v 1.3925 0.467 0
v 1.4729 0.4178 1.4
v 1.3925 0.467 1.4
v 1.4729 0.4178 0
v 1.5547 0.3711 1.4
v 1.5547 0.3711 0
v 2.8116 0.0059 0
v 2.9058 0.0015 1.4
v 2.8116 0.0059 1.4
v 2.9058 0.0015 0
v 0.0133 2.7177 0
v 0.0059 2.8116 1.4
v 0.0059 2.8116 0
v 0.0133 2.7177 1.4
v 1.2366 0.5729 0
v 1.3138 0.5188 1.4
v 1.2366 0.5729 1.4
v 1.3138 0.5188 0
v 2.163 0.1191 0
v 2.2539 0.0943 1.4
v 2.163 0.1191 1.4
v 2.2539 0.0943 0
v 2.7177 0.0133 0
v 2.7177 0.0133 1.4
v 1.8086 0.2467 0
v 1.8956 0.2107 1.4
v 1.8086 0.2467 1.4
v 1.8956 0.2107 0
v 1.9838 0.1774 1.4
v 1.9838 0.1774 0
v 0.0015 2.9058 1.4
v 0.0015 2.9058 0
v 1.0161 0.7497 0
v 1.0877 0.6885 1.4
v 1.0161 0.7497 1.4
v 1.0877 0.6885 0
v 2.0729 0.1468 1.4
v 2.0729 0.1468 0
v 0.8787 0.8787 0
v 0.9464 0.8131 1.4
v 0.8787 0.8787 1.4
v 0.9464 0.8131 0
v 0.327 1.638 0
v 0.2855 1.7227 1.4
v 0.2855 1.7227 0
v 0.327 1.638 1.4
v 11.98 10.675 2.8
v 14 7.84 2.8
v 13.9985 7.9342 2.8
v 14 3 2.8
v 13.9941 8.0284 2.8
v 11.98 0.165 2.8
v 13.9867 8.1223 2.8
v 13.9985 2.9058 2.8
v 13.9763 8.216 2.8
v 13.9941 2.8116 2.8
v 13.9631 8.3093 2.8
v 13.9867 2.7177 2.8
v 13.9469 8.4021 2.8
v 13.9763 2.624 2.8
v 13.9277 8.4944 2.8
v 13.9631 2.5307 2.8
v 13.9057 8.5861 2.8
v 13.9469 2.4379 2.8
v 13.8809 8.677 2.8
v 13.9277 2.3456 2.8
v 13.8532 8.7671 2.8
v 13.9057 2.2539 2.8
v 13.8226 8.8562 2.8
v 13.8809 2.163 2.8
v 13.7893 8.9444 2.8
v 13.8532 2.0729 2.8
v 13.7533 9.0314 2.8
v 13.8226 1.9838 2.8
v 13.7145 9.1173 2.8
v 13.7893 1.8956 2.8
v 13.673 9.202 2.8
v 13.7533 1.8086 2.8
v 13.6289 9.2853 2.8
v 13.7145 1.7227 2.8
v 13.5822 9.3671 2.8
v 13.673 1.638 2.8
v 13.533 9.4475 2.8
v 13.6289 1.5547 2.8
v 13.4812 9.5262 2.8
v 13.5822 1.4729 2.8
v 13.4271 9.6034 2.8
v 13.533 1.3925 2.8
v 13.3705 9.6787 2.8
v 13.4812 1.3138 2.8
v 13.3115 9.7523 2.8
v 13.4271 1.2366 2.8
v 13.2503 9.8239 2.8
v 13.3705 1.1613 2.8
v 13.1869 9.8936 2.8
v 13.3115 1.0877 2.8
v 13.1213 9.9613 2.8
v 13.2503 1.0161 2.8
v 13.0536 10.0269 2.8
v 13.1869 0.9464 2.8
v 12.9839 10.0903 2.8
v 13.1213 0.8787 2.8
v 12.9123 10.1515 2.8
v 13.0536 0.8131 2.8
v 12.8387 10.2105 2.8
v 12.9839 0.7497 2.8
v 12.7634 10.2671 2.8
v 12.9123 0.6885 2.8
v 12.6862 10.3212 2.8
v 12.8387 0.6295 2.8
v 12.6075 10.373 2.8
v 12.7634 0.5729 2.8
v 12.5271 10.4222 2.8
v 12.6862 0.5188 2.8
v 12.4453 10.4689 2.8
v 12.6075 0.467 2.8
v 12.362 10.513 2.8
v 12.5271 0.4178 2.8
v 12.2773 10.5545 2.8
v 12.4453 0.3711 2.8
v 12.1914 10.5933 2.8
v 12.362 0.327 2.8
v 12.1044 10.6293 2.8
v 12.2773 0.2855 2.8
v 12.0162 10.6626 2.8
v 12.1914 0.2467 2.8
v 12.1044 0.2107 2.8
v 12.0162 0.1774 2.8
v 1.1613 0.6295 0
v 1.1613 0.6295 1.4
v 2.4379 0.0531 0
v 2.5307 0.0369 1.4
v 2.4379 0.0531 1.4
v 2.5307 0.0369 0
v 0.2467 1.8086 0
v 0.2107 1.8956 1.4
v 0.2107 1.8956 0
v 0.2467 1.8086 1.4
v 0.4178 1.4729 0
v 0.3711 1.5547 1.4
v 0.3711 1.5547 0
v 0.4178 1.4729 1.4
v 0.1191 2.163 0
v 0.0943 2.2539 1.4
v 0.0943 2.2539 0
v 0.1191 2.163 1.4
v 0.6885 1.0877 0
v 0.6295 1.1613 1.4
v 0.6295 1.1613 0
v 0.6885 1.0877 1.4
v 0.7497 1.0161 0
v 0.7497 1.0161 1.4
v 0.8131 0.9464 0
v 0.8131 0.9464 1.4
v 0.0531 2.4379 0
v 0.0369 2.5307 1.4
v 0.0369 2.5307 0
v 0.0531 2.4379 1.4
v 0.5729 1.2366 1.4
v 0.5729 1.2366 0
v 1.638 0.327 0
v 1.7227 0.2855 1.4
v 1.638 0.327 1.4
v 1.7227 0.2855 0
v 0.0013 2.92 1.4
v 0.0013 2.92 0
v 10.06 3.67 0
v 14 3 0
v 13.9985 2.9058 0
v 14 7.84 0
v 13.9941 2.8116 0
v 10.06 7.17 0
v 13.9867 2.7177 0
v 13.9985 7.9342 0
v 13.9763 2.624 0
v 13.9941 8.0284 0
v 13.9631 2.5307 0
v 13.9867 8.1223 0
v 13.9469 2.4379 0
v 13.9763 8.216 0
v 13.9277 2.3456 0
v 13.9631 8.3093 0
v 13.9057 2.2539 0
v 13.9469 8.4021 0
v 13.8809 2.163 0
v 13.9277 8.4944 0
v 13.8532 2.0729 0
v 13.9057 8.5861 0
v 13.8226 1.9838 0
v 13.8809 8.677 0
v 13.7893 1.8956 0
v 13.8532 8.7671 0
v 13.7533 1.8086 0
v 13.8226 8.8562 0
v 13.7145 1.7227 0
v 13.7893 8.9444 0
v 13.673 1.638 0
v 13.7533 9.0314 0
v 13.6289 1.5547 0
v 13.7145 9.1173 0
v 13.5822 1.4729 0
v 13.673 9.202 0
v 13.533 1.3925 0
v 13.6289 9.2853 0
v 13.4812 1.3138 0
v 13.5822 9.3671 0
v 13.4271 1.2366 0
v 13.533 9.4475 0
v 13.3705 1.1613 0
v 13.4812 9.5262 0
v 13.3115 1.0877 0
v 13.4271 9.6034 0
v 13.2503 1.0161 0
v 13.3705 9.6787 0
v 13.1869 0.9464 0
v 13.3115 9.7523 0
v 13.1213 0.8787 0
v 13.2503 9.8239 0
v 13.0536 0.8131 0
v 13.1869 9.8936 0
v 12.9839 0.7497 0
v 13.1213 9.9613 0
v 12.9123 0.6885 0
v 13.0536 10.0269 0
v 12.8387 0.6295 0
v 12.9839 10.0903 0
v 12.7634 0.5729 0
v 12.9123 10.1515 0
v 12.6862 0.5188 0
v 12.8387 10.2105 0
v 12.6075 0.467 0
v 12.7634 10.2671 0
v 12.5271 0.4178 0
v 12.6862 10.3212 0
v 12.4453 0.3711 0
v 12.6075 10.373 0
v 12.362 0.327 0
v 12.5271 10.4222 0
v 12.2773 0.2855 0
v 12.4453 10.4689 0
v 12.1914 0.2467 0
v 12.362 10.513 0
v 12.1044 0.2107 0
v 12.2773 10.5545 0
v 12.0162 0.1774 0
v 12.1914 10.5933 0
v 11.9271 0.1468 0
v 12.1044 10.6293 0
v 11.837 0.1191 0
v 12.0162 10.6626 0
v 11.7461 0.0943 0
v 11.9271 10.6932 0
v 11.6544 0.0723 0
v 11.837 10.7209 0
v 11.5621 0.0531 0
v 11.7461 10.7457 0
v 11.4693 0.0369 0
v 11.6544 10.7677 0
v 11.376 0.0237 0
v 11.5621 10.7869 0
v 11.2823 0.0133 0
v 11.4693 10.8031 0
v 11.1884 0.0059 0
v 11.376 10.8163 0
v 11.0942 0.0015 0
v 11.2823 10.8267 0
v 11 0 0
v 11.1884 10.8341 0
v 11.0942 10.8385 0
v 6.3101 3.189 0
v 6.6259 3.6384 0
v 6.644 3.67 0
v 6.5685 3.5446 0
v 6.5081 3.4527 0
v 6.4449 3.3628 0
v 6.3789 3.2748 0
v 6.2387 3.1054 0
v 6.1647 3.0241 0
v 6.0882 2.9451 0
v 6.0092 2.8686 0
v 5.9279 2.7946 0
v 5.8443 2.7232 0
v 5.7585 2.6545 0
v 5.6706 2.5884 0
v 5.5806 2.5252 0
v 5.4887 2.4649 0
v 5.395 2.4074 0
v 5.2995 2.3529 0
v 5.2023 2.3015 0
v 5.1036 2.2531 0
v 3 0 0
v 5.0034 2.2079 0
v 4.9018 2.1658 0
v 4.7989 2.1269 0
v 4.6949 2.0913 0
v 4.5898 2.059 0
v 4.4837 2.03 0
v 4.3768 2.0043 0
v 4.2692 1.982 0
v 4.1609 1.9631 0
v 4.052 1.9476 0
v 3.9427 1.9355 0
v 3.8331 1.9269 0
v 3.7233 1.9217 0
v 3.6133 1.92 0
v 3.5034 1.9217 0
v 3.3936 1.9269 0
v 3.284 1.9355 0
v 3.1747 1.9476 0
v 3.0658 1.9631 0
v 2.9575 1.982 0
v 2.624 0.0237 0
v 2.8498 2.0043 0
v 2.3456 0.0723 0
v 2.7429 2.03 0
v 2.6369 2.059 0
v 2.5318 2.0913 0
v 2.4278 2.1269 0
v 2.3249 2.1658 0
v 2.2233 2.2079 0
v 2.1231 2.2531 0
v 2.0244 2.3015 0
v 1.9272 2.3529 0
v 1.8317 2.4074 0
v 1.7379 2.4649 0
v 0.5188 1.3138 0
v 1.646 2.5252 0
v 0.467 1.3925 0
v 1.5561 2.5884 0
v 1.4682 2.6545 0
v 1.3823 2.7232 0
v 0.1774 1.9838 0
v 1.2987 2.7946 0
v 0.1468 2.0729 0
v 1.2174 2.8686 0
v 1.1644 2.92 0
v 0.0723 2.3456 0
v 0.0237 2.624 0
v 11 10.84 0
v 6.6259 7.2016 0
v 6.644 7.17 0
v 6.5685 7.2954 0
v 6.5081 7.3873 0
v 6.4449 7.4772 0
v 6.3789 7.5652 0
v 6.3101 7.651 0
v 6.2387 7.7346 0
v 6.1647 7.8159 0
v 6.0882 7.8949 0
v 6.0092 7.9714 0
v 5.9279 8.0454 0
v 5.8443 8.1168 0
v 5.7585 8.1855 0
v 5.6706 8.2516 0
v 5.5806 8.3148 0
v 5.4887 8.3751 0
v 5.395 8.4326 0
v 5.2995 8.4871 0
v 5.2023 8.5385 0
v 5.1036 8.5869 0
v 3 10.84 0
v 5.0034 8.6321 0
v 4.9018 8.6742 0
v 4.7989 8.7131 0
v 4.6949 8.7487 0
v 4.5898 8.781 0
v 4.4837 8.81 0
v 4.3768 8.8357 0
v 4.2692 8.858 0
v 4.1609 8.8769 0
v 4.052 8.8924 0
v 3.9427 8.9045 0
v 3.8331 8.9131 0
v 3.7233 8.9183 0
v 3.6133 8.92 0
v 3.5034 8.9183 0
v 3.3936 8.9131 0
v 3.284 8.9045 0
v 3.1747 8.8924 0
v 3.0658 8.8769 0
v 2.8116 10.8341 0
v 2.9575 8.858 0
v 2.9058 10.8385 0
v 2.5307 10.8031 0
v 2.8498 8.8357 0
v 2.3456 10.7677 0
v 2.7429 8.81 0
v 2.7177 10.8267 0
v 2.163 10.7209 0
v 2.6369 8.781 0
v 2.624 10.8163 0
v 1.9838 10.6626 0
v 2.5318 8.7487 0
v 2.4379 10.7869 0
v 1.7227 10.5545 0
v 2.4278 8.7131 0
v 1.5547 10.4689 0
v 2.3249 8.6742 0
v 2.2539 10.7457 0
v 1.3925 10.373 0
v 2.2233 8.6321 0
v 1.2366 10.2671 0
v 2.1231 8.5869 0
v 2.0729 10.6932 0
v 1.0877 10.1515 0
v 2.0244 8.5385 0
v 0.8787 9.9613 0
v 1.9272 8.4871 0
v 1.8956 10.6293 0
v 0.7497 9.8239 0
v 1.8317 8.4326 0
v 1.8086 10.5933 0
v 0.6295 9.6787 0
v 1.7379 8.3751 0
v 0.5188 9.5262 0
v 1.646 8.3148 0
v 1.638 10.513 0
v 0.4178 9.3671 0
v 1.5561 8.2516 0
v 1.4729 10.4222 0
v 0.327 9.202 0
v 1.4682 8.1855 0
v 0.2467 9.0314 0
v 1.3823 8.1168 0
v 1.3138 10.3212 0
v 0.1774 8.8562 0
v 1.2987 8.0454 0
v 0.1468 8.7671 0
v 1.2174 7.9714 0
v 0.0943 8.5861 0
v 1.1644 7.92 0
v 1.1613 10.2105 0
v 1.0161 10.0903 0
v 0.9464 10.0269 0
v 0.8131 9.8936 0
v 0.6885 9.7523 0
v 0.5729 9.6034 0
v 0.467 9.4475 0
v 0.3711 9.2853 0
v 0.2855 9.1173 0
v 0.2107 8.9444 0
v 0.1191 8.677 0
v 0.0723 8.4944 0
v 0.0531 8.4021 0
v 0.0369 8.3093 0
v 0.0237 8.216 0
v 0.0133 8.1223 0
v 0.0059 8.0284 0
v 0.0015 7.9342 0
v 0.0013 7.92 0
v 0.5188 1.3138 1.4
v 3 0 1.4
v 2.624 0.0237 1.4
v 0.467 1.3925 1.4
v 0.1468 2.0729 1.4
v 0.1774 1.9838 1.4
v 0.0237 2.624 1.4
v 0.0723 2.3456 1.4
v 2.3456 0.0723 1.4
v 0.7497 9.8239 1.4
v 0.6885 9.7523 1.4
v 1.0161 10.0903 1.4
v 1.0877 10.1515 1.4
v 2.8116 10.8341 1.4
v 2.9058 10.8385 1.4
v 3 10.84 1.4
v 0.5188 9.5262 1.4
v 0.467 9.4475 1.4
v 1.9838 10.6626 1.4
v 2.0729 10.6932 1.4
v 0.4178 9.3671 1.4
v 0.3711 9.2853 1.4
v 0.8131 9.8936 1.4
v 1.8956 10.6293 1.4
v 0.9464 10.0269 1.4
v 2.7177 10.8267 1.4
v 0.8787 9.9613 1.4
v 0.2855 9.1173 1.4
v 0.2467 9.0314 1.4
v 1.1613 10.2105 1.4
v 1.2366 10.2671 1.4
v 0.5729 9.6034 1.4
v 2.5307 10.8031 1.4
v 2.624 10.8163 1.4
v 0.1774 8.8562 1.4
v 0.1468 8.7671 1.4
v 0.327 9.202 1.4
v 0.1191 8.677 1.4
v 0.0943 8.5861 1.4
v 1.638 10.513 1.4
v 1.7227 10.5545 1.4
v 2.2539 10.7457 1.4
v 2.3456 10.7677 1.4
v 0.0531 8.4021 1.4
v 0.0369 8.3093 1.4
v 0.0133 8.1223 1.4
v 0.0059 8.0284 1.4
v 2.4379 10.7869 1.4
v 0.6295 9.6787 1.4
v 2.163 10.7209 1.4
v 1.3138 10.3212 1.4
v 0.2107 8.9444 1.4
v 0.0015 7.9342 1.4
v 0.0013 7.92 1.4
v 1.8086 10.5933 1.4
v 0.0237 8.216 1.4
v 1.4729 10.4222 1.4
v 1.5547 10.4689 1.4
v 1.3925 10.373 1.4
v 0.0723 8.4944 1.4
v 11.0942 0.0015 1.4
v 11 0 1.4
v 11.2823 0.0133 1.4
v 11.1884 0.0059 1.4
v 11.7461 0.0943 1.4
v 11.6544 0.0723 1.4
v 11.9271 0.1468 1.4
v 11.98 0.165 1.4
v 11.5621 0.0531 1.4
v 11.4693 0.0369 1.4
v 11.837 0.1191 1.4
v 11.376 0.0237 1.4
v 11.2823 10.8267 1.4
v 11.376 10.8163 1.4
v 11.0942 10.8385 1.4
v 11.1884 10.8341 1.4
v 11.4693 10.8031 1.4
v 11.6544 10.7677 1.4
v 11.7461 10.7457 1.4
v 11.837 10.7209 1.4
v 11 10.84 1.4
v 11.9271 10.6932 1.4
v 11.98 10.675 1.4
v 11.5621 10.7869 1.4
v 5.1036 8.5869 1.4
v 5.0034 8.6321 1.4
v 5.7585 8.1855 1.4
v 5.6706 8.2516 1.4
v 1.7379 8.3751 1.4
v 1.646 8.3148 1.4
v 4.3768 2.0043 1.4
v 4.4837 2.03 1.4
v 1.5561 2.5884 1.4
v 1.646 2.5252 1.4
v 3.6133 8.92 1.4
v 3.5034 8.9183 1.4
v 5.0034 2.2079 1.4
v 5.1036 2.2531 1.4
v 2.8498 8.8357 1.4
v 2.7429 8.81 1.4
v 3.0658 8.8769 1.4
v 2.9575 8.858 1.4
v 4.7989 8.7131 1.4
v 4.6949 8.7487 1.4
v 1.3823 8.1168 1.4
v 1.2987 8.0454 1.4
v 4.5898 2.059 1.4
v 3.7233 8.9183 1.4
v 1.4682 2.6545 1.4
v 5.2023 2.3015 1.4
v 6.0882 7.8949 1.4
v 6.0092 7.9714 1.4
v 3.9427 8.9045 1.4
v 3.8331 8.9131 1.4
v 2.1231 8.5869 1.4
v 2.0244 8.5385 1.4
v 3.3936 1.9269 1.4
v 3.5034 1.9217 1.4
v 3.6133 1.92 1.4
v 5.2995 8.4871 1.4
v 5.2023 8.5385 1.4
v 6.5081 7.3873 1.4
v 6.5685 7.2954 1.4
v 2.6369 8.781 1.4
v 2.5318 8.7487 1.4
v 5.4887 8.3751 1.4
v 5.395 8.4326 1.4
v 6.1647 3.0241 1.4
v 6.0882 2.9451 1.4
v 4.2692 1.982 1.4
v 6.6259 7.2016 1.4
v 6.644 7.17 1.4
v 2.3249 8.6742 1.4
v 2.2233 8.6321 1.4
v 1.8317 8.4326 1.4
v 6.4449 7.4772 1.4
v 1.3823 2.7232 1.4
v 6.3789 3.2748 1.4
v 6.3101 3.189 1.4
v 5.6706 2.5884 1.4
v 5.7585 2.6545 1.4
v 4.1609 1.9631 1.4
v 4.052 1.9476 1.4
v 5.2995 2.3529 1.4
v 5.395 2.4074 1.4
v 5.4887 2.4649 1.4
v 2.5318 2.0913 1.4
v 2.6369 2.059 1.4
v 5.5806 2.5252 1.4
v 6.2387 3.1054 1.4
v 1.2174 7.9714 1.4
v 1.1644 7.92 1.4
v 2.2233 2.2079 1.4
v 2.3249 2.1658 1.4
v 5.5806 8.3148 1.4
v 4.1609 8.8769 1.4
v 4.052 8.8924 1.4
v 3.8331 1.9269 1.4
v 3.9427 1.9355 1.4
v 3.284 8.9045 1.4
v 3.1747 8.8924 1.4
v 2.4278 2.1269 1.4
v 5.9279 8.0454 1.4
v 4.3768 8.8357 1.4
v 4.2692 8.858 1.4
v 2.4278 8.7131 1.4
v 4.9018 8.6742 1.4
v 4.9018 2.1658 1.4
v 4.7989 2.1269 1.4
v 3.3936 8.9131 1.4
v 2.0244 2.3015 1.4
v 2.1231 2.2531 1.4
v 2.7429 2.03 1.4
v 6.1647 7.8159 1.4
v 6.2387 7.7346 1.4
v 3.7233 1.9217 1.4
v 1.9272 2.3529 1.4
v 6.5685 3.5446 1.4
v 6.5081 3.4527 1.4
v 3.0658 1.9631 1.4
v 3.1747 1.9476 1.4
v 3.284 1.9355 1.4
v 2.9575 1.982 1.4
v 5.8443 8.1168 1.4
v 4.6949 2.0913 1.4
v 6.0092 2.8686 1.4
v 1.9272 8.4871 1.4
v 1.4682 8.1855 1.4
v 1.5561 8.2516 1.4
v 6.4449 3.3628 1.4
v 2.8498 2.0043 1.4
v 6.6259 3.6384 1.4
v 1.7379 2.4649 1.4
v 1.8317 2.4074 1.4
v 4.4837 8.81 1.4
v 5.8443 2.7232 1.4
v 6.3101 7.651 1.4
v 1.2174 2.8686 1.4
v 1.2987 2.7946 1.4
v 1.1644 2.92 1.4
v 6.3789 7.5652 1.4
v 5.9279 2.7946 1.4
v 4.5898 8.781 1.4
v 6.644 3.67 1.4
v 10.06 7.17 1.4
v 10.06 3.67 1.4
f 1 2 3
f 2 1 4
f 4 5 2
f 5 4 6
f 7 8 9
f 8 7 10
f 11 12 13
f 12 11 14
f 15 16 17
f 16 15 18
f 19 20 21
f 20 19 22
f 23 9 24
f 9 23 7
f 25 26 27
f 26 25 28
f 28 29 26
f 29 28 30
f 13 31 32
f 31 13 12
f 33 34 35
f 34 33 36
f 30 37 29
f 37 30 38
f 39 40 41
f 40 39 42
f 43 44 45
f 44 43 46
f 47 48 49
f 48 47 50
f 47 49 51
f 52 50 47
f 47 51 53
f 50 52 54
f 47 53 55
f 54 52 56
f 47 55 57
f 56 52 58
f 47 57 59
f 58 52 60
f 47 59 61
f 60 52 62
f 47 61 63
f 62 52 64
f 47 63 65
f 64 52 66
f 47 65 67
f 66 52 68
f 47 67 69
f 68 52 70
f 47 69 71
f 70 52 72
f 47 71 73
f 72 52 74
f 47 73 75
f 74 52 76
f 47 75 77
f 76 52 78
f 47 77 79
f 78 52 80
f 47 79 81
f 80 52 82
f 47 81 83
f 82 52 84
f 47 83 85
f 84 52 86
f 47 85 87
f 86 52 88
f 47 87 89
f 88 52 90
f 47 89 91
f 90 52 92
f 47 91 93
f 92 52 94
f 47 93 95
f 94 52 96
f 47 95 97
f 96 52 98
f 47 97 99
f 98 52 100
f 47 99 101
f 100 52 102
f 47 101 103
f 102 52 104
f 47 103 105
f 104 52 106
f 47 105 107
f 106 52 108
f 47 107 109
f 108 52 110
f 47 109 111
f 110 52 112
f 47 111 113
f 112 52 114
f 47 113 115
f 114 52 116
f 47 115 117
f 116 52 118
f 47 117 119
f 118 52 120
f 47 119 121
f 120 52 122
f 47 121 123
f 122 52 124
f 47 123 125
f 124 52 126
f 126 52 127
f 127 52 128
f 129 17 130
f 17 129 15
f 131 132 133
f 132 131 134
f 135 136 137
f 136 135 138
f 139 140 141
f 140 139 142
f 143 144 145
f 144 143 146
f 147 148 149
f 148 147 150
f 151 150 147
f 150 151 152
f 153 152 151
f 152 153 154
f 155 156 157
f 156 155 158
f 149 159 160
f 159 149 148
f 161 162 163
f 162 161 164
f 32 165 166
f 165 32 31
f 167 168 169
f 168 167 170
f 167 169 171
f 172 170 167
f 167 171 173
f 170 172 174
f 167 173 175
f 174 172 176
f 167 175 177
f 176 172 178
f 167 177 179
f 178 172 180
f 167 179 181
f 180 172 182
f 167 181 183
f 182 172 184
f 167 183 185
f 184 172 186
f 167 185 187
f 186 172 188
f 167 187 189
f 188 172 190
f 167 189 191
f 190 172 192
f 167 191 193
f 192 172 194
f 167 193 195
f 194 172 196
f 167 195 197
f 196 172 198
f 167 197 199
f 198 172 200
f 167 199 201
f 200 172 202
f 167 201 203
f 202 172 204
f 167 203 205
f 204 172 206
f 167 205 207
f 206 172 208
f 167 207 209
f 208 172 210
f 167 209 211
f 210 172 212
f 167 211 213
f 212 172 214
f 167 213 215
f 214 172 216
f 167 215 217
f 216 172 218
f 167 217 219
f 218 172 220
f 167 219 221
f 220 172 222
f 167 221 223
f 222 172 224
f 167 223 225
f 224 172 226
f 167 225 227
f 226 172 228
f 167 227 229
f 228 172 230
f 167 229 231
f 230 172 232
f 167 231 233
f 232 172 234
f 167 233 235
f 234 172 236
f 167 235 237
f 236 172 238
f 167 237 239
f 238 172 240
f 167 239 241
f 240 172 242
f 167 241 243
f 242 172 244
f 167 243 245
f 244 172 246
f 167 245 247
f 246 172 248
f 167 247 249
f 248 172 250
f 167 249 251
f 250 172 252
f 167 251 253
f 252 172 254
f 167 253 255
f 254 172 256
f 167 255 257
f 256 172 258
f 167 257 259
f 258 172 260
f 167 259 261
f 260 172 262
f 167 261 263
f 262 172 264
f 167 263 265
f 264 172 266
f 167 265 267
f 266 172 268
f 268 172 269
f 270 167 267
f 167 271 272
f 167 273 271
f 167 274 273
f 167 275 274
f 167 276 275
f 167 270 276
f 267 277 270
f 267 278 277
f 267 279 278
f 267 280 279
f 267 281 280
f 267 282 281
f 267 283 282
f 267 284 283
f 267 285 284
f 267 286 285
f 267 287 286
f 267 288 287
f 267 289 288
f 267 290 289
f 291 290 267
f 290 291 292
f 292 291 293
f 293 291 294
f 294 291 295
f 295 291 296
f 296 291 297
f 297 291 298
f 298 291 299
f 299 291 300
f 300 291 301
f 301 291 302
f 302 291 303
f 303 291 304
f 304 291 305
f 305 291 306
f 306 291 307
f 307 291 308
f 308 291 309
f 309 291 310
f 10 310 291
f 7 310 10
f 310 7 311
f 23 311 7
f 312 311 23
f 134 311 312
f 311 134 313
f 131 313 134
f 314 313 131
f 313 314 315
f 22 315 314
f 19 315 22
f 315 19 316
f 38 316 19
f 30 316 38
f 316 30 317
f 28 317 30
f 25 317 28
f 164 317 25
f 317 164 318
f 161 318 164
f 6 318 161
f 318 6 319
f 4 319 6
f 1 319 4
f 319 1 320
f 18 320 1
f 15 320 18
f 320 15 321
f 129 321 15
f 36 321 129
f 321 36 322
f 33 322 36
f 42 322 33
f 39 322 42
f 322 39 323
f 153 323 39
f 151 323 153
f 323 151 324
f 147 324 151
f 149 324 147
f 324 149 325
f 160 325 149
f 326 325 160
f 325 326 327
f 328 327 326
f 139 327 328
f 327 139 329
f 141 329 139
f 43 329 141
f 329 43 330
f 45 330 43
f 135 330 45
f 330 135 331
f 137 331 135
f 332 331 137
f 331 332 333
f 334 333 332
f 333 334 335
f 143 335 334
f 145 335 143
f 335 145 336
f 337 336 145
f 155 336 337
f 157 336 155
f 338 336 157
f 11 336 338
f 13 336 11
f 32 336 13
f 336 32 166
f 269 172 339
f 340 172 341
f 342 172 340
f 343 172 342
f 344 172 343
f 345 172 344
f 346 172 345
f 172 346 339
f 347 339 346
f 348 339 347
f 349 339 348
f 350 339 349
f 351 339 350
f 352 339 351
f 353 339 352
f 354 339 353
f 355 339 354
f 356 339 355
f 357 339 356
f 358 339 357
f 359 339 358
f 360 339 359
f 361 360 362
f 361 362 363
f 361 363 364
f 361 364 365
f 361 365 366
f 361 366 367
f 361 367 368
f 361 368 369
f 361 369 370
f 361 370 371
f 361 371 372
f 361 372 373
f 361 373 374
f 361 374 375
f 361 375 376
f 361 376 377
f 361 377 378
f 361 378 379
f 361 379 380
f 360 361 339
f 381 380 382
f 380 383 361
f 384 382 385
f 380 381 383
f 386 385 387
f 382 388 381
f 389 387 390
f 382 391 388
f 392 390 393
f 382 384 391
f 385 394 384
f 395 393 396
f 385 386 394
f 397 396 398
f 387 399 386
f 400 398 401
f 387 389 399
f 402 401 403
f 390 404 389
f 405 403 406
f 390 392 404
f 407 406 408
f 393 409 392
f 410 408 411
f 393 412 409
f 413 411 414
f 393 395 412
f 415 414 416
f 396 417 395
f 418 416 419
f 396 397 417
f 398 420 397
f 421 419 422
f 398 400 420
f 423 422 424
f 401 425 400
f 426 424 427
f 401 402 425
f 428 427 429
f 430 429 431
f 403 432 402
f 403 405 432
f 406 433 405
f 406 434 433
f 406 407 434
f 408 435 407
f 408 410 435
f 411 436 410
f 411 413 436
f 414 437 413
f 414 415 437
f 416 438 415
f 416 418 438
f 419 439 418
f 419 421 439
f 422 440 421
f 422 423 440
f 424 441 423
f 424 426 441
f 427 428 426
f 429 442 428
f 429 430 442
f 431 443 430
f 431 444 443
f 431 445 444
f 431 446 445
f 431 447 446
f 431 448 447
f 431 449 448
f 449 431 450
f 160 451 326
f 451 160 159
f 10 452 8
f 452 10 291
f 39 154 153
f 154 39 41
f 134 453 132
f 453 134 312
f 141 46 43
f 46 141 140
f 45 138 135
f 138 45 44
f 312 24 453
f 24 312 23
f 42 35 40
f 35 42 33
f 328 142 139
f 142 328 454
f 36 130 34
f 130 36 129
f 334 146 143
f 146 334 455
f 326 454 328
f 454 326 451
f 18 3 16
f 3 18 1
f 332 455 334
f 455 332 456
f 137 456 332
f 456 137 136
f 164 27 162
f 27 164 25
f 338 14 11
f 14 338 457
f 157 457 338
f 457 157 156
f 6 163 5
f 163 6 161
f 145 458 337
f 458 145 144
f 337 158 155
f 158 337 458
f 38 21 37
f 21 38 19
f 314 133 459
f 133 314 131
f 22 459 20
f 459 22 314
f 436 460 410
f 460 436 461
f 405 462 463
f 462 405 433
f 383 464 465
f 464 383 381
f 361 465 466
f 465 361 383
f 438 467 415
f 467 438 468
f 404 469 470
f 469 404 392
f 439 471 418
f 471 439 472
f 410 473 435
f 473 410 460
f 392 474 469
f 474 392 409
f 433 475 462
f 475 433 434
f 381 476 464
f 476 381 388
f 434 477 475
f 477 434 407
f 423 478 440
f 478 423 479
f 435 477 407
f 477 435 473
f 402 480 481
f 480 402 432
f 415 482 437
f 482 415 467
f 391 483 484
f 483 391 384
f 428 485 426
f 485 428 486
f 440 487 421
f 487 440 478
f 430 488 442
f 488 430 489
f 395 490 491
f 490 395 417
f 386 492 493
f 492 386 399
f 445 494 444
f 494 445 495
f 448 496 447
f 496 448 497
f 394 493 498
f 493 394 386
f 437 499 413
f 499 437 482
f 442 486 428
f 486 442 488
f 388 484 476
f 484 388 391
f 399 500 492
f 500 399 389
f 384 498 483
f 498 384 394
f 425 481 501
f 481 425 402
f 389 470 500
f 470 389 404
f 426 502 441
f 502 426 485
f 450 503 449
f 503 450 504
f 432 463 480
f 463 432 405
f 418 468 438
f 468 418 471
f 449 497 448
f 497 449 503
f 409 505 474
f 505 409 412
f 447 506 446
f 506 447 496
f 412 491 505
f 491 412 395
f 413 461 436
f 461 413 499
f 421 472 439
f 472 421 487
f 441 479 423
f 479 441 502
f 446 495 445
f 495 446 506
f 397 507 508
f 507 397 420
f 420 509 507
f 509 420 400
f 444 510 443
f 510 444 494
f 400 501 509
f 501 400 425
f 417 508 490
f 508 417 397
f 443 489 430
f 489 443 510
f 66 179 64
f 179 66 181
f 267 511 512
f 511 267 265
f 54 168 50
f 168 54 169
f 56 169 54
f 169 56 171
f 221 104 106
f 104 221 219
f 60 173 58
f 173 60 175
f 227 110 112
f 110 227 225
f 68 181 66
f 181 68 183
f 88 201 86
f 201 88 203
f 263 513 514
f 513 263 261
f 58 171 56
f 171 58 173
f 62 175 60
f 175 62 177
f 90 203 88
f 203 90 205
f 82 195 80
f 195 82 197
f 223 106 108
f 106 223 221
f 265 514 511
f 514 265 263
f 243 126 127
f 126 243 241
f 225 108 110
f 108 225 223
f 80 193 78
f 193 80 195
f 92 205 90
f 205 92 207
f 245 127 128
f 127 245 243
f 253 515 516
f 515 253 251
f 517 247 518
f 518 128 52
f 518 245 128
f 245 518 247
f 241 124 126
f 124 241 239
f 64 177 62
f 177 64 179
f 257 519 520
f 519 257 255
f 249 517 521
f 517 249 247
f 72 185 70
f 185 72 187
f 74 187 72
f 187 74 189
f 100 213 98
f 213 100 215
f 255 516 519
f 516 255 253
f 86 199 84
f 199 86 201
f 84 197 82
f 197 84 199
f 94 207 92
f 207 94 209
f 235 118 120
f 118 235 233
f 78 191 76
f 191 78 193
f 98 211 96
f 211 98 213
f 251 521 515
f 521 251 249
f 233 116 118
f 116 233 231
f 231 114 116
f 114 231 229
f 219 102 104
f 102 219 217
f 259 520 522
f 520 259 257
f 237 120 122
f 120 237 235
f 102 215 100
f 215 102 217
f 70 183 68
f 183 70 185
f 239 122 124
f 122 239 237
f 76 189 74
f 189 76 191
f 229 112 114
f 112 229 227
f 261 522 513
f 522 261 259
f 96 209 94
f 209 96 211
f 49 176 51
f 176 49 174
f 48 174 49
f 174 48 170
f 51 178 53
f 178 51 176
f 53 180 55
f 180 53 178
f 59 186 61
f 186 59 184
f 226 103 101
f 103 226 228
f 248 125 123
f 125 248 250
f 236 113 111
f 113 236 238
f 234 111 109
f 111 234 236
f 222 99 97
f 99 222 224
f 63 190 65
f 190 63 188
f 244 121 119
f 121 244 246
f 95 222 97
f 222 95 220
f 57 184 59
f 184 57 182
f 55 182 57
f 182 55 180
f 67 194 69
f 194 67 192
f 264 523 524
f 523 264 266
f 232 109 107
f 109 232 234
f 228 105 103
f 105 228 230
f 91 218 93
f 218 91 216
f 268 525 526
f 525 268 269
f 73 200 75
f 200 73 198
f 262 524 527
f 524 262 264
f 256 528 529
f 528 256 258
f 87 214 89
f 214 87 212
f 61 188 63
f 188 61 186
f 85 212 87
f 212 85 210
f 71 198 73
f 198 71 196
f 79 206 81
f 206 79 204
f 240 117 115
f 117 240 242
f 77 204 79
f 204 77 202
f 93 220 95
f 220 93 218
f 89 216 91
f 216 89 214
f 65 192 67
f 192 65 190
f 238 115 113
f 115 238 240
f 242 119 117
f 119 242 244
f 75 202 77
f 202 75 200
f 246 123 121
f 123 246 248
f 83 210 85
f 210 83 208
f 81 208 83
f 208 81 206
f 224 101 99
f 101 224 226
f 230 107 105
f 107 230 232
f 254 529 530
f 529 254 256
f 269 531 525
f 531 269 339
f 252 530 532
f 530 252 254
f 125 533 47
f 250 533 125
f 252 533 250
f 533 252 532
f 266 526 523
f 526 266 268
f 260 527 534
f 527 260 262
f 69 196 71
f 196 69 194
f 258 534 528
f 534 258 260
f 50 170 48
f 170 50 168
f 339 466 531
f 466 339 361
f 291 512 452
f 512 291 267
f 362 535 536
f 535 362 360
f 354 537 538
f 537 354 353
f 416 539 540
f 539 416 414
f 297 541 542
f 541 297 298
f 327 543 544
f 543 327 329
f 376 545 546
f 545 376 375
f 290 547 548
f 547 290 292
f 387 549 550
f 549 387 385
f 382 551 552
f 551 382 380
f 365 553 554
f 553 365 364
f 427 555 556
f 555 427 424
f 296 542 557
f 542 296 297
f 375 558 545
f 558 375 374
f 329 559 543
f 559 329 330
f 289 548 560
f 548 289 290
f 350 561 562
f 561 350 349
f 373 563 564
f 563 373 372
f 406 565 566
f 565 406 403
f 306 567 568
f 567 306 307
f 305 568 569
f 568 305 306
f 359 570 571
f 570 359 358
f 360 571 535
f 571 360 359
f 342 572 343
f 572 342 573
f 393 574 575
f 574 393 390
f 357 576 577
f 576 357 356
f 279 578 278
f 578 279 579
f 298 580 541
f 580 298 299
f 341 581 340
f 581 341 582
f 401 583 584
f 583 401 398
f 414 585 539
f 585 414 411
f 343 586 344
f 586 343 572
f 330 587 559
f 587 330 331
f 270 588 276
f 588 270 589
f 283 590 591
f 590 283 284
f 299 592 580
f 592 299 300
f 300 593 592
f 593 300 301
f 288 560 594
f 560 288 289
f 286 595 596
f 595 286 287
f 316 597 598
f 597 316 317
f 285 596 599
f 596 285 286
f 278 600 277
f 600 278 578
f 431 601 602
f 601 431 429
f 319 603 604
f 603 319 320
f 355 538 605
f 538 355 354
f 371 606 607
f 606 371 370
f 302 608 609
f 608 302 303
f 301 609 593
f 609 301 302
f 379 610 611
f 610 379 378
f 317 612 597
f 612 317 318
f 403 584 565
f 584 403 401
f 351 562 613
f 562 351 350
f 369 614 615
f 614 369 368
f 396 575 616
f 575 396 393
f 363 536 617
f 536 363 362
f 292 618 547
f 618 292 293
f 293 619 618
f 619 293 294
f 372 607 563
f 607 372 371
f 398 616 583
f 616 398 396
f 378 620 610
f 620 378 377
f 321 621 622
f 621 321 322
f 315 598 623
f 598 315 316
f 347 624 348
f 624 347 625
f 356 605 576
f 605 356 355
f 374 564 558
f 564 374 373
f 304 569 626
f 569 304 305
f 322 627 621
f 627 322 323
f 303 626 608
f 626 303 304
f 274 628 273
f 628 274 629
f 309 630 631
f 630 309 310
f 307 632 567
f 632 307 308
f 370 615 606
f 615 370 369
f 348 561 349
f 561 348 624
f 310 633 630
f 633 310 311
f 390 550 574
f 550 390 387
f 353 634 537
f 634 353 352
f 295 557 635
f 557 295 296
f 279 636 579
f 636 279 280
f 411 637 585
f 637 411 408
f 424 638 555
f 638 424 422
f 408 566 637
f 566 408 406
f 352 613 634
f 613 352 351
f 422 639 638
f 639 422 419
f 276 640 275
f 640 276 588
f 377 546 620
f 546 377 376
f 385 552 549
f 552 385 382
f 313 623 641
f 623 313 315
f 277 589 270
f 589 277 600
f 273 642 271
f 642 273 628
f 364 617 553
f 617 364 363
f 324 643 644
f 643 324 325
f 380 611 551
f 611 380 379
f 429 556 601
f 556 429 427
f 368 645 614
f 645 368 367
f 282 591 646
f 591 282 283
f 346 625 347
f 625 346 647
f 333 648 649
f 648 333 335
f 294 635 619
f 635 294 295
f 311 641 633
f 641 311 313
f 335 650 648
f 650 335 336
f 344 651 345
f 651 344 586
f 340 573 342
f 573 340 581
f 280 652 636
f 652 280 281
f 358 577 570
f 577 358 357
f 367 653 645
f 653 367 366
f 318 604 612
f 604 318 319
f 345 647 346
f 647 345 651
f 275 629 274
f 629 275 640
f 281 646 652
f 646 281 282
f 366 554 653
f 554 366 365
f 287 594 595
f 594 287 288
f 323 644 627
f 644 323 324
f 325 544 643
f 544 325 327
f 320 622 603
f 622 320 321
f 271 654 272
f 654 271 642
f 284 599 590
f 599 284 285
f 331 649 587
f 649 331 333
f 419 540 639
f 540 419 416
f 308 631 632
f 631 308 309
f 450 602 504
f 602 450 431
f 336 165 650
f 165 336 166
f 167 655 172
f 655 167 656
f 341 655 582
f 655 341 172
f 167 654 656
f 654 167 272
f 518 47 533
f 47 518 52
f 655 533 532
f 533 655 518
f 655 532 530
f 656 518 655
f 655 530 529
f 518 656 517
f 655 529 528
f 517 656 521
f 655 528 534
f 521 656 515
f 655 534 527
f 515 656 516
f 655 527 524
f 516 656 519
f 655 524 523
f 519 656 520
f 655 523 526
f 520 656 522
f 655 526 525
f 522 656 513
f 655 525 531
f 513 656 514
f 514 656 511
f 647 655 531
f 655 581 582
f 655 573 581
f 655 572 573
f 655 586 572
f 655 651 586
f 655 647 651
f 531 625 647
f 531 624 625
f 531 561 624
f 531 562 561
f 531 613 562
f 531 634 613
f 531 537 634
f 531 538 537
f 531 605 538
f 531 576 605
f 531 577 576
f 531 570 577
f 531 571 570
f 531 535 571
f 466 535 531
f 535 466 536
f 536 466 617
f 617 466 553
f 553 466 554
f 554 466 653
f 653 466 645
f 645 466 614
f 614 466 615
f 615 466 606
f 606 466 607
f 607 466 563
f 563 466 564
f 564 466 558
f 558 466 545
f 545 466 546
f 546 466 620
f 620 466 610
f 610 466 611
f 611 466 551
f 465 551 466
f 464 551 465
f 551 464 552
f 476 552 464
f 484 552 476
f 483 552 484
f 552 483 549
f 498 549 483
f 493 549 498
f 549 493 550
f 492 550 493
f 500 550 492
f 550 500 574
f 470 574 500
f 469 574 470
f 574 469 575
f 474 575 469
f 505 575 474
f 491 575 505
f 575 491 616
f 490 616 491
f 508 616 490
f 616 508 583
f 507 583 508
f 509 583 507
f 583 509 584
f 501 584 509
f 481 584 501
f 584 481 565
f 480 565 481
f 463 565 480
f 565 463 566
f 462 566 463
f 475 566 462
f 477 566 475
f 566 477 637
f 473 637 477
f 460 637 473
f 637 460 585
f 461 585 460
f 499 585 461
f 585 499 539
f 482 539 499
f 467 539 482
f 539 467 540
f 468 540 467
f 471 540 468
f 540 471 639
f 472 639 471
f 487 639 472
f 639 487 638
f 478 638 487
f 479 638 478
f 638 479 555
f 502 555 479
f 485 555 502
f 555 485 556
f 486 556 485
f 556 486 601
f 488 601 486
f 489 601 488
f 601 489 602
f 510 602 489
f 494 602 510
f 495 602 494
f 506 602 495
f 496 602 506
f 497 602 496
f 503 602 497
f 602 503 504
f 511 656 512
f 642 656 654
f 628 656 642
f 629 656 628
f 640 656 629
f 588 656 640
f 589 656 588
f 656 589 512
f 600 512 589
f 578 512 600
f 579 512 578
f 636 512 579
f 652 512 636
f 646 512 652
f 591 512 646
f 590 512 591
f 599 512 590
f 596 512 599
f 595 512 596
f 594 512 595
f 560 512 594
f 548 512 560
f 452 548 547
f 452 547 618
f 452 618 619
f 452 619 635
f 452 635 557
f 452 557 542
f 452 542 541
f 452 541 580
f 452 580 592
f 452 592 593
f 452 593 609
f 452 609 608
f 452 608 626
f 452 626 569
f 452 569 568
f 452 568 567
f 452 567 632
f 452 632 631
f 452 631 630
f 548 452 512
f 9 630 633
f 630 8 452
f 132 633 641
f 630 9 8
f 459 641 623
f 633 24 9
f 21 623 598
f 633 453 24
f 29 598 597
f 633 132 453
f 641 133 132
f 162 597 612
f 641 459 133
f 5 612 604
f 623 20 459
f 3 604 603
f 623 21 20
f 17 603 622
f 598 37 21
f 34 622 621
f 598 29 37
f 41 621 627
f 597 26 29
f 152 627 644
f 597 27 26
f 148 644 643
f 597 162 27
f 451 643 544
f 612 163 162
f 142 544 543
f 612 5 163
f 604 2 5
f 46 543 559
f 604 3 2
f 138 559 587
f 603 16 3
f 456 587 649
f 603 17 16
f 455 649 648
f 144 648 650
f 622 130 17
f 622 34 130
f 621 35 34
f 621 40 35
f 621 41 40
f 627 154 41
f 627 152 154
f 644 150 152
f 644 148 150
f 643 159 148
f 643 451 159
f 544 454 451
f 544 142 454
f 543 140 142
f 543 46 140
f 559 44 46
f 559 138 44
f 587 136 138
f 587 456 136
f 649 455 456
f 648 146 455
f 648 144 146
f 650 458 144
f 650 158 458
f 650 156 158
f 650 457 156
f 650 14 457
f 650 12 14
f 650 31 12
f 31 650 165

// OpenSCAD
// file: ../sc.scad
// ShortCuts.scad 
// Autor: Rudolf Huttary, Berlin 2015
//
$fn = 100; 

//show_examples(); 

module show_examples()
	place_in_rect(30, 30)
	{
		Cy(h = 10); 
		CyH(h = 10); 
		CyH(h = 10, w = 30); 
		CyS(h = 10); 
		CyS(h = 10, w1 = 25, w2 = 75); 
		Cu(10); 
		Ri(h = 10); 
		RiH(h = 10); 
		RiS(h = 10, w1 = 10); 
		RiS(h = 10, w1 = 30, w2 = 300); 
		Sp(); 
		SpH(10, 30, 30); 
	}


module help()
{
echo("==============="); 
echo("help(): shows this help"); 
echo("show_examples(): shows some examples"); 
echo("place_in_rect(): places children objects in grid"); 
echo("Transformations:"); 
echo(" transform :  T(x=0, y=0, z=0), Tx(x=0) , Ty(y=0), Tz(z=0)"); 
echo(" rotate :  R(x=0, y=0, z=0), Rx(x=0) , Ry(y=0), Rz(z=0)"); 
echo(" scale :  S(x=1, y=1, z=1), Sx(x=1) , Sy(y=1), Sz(z=1)"); 
echo("Logical"); 
echo(" difference :  D()"); 
echo(" union :  U()"); 
echo(" intersection : *missing*"); 
echo("Primitives"); 
echo(" circle :  Ci(r=10)"); 
echo(" circle_half :  CiH(r=10, w=0)")
echo(" circle_segment :  CiS(r=10, w1=0, w2=90)")
echo(" square :  Sq(x=10, y=0, center=true))"); 
echo(" cylinder :  Cy(r=10, h=1, center=true)"); 
echo(" cylinder_half :  CyH(r=10, w=0)")
echo(" cylinder_segment: CyS(r=10, h=1, w1=0, w2=90,center=true)"); 
echo(" cylinder_segment: Pie(r=10, h=1, w1=0, w2=90,center=true)"); 
echo(" cube :  Cu(x=10, y=0, z=10, center=true)"); 
echo(" ring :  Ri(R=10, r=5, h=1, center=true)"); 
echo(" ring_half :  RiH(R=10, r=5, h=1, w=0 center=true)"); 
echo(" ring_segment :  RiS(R=10, r=5, h=1, w1=0, w2=90, center=true)"); 
echo(" sphere:  Sp(r=10))"); 
echo(" sphere_half:  SpH(r=10, w1 = 0, w2 = 0))"); 
echo("==============="); 
}

// Euclidean Transformations
module T(x=0, y=0, z=0){translate([x, y, z])children(); }
module Tx(x) { translate([x, 0, 0])children(); }
module Ty(y) { translate([0, y, 0])children(); }
module Tz(z) { translate([0, 0, z])children(); }

module R(x=0, y=0, z=0){rotate([x, y, z]) children();}
module Rx(x=90){rotate([x, 0, 0]) children();}
module Ry(y=90){rotate([0, y, 0]) children();}
module Rz(z=90){rotate([0, 0, z]) children();}

module M(x=0, y=0, z=0){mirror([x, y, z]) children();}
module Mx(x=1){mirror([x, 0, 0]) children();}
module My(y=1){mirror([0, y, 0]) children();}
module Mz(z=1){mirror([0, 0, z]) children();}

module S(x=1, y=1, z=1){scale([x, y, z]) children();}
module Sx(x=1){scale([x, 1, 1]) children();}
module Sy(y=1){scale([1, y, 1]) children();}
module Sz(z=1){scale([1, 1, z]) children();}

module D() difference(){children(0); children([1:$children-1]);}
module U() children([0:$children-1]);
// module I() intersection()children([0:$children-1]); // does not work for some reason


// primitives - 2D

module Sq(x =10, y = 0, center = false)
{
   if(y==0)
		square([x, x], center = center); 
	else
		square([x, y], center = center); 
}
module Ci(r = 10)
{
	circle(r = r); 
}

// derived primitives - 2d
module CiH(r = 10, w = 0)
  circle_half(r, w); 

module CiS(r = 10, w1 = 0, w2 = 90)
  circle_segment(r, w1, w2); 


// primitives - 3d
module Cy(r = 10, h = 1, center = false)
{
	cylinder(r = r, h = h, center = center); 
}
module Cu(x = 10, y = 0, z = 10, center = false)
{
  if (y==0)
	cube([x, x, x], center = center); 
  else
	cube([x, y, z], center = center); 
}

// derived primitives - 3d
module CyH(r = 10, h = 1, w = 0, center = false)
  cylinder_half(r, h, w, center); 

module CyS(r = 10, h = 1, w1 = 0, w2 = 90, center = false)
  cylinder_segment(r, h, w1, w2, center); 

module Ri(R = 10, r = 5, h = 1, center = false)
  ring(R, r, h, center); 

module RiS(R = 10, r = 5, h = 1, w1 = 0, w2 = 90, center = false)
   ring_segment(R, r, h, w1, w2, center); 

module RiH(r1 = 10, r2, h = 1, w = 0, center = false)
   ring_half(r1, r2, h, w, center); 
module Pie(r = 10, h = 1, w1 = 0, w2 = 90, center = false)
  cylinder_segment(r, h, w1, w2, center);  
module Sp(r = 10)
  sphere(r); 
module SpH(r = 10, w1 = 0, w2 = 0)
  sphere_half(r, w1, w2); 
module SpS(r = 10, w1 = 0, w2 = 90, w3 = 90)
  sphere_segment(r, w1, w2); 




// clear text definitions
module circle_half(r = 10, w = 0)
{
	difference()
	{
		circle(r); 
     rotate([0, 0, w-90])
     translate([0, -r])
		square([r, 2*r], center = false); 
	}
}

module circle_segment(r = 10, w1 = 0, w2 = 90)
{
  W2 = (w1>w2)?w2+360:w2; 
  if (W2-w1 < 180)
    intersection()
		{
       circle_half(r, w1); 
       circle_half(r, W2-180); 
 		}
	else
    union()
		{
       circle_half(r, w1); 
       circle_half(r, W2-180); 
 		}
}

module cylinder_half(r = 10, h = 1, w = 0, center = true)
{
  linear_extrude(height = h, center = center)
  circle_half(r, w); 
} 

module cylinder_segment(r = 10, h = 1, w1 = 0, w2 = 90, center = true)
{
  linear_extrude(height = h, center = center)
  circle_segment(r, w1, w2); 
} 

module ring(R = 10, r = 5, h = 1, center = true)
{
	difference()
	{
	cylinder(r = R, h = h, center = center); 
   translate([0, 0, -2*h])
	cylinder(r = r, h = 4*h, center = false); 
	}
}

module ring_half(R = 10, r = 5, h = 1, w = 0, center = true)
{
	difference()
	{
		ring(R, r, h, center); 
     rotate([0, 0, w])
     translate([0, -R/2, 0])
		cube([2*R, R, 3*h], center = true); 
	}
}

module ring_segment(R = 10, r = 5, h = 1, w1 = 0, w2 = 90, center = true)
{
  W2 = (w1>w2)?w2+360:w2; 
  if (W2-w1 < 180)
    intersection()
		{
       ring_half(R, r, h, w1, center); 
       ring_half(R, r, h, W2-180, center); 
 		}
	else
    union()
		{
       ring_half(R, r, h, w1, center); 
       ring_half(R, r, h, W2-180, center); 
 		}
}


module sphere_half(r = 10, w1 = 0, w2 = 0)
{  
	difference()
	{
   	sphere(r); 
      rotate([-w1, -w2, 0])
     	translate([0, 0, r])
		cube([2*r, 2*r, r], center = true); 
	}

}


// additional code
module place_in_rect(dx =20, dy=20)
{
  cols = ceil(sqrt($children)); 
  rows = floor(sqrt($children)); 
  for(i = [0:$children-1])
	{ 
	  T(dx*(-cols/2+(i%cols)+.5), dy*(rows/2-floor(i/cols)-.5))
		 children(i); 
	}
}
// main file
use <../lib.scad>
$fn=200;
cf=.4;  // Fit
cl=.3;  // Cleareance

ct=.3;  // Thread

lw=0.64;    // linewidth

h=1.4;
iw=7;
l=14;
w=iw + lw*6;
echo(w);

difference(){
    rcube(l,w,h*2,3);
    
    translate([w/3,w/2,-.1])
    cylinder(d=iw, h=h*3);

    translate([-.1,w/2-(iw-2)/2,-.1])
    scube(iw/2,iw-2,h*3);

    translate([-.1,w/2-iw/4,-.1])
    scube(l-lw*6,iw/2,h*3);
    
    // top cut
    translate([-.1,-.1,h])
    scube(l-lw*3,w+1,h*2);
}    
